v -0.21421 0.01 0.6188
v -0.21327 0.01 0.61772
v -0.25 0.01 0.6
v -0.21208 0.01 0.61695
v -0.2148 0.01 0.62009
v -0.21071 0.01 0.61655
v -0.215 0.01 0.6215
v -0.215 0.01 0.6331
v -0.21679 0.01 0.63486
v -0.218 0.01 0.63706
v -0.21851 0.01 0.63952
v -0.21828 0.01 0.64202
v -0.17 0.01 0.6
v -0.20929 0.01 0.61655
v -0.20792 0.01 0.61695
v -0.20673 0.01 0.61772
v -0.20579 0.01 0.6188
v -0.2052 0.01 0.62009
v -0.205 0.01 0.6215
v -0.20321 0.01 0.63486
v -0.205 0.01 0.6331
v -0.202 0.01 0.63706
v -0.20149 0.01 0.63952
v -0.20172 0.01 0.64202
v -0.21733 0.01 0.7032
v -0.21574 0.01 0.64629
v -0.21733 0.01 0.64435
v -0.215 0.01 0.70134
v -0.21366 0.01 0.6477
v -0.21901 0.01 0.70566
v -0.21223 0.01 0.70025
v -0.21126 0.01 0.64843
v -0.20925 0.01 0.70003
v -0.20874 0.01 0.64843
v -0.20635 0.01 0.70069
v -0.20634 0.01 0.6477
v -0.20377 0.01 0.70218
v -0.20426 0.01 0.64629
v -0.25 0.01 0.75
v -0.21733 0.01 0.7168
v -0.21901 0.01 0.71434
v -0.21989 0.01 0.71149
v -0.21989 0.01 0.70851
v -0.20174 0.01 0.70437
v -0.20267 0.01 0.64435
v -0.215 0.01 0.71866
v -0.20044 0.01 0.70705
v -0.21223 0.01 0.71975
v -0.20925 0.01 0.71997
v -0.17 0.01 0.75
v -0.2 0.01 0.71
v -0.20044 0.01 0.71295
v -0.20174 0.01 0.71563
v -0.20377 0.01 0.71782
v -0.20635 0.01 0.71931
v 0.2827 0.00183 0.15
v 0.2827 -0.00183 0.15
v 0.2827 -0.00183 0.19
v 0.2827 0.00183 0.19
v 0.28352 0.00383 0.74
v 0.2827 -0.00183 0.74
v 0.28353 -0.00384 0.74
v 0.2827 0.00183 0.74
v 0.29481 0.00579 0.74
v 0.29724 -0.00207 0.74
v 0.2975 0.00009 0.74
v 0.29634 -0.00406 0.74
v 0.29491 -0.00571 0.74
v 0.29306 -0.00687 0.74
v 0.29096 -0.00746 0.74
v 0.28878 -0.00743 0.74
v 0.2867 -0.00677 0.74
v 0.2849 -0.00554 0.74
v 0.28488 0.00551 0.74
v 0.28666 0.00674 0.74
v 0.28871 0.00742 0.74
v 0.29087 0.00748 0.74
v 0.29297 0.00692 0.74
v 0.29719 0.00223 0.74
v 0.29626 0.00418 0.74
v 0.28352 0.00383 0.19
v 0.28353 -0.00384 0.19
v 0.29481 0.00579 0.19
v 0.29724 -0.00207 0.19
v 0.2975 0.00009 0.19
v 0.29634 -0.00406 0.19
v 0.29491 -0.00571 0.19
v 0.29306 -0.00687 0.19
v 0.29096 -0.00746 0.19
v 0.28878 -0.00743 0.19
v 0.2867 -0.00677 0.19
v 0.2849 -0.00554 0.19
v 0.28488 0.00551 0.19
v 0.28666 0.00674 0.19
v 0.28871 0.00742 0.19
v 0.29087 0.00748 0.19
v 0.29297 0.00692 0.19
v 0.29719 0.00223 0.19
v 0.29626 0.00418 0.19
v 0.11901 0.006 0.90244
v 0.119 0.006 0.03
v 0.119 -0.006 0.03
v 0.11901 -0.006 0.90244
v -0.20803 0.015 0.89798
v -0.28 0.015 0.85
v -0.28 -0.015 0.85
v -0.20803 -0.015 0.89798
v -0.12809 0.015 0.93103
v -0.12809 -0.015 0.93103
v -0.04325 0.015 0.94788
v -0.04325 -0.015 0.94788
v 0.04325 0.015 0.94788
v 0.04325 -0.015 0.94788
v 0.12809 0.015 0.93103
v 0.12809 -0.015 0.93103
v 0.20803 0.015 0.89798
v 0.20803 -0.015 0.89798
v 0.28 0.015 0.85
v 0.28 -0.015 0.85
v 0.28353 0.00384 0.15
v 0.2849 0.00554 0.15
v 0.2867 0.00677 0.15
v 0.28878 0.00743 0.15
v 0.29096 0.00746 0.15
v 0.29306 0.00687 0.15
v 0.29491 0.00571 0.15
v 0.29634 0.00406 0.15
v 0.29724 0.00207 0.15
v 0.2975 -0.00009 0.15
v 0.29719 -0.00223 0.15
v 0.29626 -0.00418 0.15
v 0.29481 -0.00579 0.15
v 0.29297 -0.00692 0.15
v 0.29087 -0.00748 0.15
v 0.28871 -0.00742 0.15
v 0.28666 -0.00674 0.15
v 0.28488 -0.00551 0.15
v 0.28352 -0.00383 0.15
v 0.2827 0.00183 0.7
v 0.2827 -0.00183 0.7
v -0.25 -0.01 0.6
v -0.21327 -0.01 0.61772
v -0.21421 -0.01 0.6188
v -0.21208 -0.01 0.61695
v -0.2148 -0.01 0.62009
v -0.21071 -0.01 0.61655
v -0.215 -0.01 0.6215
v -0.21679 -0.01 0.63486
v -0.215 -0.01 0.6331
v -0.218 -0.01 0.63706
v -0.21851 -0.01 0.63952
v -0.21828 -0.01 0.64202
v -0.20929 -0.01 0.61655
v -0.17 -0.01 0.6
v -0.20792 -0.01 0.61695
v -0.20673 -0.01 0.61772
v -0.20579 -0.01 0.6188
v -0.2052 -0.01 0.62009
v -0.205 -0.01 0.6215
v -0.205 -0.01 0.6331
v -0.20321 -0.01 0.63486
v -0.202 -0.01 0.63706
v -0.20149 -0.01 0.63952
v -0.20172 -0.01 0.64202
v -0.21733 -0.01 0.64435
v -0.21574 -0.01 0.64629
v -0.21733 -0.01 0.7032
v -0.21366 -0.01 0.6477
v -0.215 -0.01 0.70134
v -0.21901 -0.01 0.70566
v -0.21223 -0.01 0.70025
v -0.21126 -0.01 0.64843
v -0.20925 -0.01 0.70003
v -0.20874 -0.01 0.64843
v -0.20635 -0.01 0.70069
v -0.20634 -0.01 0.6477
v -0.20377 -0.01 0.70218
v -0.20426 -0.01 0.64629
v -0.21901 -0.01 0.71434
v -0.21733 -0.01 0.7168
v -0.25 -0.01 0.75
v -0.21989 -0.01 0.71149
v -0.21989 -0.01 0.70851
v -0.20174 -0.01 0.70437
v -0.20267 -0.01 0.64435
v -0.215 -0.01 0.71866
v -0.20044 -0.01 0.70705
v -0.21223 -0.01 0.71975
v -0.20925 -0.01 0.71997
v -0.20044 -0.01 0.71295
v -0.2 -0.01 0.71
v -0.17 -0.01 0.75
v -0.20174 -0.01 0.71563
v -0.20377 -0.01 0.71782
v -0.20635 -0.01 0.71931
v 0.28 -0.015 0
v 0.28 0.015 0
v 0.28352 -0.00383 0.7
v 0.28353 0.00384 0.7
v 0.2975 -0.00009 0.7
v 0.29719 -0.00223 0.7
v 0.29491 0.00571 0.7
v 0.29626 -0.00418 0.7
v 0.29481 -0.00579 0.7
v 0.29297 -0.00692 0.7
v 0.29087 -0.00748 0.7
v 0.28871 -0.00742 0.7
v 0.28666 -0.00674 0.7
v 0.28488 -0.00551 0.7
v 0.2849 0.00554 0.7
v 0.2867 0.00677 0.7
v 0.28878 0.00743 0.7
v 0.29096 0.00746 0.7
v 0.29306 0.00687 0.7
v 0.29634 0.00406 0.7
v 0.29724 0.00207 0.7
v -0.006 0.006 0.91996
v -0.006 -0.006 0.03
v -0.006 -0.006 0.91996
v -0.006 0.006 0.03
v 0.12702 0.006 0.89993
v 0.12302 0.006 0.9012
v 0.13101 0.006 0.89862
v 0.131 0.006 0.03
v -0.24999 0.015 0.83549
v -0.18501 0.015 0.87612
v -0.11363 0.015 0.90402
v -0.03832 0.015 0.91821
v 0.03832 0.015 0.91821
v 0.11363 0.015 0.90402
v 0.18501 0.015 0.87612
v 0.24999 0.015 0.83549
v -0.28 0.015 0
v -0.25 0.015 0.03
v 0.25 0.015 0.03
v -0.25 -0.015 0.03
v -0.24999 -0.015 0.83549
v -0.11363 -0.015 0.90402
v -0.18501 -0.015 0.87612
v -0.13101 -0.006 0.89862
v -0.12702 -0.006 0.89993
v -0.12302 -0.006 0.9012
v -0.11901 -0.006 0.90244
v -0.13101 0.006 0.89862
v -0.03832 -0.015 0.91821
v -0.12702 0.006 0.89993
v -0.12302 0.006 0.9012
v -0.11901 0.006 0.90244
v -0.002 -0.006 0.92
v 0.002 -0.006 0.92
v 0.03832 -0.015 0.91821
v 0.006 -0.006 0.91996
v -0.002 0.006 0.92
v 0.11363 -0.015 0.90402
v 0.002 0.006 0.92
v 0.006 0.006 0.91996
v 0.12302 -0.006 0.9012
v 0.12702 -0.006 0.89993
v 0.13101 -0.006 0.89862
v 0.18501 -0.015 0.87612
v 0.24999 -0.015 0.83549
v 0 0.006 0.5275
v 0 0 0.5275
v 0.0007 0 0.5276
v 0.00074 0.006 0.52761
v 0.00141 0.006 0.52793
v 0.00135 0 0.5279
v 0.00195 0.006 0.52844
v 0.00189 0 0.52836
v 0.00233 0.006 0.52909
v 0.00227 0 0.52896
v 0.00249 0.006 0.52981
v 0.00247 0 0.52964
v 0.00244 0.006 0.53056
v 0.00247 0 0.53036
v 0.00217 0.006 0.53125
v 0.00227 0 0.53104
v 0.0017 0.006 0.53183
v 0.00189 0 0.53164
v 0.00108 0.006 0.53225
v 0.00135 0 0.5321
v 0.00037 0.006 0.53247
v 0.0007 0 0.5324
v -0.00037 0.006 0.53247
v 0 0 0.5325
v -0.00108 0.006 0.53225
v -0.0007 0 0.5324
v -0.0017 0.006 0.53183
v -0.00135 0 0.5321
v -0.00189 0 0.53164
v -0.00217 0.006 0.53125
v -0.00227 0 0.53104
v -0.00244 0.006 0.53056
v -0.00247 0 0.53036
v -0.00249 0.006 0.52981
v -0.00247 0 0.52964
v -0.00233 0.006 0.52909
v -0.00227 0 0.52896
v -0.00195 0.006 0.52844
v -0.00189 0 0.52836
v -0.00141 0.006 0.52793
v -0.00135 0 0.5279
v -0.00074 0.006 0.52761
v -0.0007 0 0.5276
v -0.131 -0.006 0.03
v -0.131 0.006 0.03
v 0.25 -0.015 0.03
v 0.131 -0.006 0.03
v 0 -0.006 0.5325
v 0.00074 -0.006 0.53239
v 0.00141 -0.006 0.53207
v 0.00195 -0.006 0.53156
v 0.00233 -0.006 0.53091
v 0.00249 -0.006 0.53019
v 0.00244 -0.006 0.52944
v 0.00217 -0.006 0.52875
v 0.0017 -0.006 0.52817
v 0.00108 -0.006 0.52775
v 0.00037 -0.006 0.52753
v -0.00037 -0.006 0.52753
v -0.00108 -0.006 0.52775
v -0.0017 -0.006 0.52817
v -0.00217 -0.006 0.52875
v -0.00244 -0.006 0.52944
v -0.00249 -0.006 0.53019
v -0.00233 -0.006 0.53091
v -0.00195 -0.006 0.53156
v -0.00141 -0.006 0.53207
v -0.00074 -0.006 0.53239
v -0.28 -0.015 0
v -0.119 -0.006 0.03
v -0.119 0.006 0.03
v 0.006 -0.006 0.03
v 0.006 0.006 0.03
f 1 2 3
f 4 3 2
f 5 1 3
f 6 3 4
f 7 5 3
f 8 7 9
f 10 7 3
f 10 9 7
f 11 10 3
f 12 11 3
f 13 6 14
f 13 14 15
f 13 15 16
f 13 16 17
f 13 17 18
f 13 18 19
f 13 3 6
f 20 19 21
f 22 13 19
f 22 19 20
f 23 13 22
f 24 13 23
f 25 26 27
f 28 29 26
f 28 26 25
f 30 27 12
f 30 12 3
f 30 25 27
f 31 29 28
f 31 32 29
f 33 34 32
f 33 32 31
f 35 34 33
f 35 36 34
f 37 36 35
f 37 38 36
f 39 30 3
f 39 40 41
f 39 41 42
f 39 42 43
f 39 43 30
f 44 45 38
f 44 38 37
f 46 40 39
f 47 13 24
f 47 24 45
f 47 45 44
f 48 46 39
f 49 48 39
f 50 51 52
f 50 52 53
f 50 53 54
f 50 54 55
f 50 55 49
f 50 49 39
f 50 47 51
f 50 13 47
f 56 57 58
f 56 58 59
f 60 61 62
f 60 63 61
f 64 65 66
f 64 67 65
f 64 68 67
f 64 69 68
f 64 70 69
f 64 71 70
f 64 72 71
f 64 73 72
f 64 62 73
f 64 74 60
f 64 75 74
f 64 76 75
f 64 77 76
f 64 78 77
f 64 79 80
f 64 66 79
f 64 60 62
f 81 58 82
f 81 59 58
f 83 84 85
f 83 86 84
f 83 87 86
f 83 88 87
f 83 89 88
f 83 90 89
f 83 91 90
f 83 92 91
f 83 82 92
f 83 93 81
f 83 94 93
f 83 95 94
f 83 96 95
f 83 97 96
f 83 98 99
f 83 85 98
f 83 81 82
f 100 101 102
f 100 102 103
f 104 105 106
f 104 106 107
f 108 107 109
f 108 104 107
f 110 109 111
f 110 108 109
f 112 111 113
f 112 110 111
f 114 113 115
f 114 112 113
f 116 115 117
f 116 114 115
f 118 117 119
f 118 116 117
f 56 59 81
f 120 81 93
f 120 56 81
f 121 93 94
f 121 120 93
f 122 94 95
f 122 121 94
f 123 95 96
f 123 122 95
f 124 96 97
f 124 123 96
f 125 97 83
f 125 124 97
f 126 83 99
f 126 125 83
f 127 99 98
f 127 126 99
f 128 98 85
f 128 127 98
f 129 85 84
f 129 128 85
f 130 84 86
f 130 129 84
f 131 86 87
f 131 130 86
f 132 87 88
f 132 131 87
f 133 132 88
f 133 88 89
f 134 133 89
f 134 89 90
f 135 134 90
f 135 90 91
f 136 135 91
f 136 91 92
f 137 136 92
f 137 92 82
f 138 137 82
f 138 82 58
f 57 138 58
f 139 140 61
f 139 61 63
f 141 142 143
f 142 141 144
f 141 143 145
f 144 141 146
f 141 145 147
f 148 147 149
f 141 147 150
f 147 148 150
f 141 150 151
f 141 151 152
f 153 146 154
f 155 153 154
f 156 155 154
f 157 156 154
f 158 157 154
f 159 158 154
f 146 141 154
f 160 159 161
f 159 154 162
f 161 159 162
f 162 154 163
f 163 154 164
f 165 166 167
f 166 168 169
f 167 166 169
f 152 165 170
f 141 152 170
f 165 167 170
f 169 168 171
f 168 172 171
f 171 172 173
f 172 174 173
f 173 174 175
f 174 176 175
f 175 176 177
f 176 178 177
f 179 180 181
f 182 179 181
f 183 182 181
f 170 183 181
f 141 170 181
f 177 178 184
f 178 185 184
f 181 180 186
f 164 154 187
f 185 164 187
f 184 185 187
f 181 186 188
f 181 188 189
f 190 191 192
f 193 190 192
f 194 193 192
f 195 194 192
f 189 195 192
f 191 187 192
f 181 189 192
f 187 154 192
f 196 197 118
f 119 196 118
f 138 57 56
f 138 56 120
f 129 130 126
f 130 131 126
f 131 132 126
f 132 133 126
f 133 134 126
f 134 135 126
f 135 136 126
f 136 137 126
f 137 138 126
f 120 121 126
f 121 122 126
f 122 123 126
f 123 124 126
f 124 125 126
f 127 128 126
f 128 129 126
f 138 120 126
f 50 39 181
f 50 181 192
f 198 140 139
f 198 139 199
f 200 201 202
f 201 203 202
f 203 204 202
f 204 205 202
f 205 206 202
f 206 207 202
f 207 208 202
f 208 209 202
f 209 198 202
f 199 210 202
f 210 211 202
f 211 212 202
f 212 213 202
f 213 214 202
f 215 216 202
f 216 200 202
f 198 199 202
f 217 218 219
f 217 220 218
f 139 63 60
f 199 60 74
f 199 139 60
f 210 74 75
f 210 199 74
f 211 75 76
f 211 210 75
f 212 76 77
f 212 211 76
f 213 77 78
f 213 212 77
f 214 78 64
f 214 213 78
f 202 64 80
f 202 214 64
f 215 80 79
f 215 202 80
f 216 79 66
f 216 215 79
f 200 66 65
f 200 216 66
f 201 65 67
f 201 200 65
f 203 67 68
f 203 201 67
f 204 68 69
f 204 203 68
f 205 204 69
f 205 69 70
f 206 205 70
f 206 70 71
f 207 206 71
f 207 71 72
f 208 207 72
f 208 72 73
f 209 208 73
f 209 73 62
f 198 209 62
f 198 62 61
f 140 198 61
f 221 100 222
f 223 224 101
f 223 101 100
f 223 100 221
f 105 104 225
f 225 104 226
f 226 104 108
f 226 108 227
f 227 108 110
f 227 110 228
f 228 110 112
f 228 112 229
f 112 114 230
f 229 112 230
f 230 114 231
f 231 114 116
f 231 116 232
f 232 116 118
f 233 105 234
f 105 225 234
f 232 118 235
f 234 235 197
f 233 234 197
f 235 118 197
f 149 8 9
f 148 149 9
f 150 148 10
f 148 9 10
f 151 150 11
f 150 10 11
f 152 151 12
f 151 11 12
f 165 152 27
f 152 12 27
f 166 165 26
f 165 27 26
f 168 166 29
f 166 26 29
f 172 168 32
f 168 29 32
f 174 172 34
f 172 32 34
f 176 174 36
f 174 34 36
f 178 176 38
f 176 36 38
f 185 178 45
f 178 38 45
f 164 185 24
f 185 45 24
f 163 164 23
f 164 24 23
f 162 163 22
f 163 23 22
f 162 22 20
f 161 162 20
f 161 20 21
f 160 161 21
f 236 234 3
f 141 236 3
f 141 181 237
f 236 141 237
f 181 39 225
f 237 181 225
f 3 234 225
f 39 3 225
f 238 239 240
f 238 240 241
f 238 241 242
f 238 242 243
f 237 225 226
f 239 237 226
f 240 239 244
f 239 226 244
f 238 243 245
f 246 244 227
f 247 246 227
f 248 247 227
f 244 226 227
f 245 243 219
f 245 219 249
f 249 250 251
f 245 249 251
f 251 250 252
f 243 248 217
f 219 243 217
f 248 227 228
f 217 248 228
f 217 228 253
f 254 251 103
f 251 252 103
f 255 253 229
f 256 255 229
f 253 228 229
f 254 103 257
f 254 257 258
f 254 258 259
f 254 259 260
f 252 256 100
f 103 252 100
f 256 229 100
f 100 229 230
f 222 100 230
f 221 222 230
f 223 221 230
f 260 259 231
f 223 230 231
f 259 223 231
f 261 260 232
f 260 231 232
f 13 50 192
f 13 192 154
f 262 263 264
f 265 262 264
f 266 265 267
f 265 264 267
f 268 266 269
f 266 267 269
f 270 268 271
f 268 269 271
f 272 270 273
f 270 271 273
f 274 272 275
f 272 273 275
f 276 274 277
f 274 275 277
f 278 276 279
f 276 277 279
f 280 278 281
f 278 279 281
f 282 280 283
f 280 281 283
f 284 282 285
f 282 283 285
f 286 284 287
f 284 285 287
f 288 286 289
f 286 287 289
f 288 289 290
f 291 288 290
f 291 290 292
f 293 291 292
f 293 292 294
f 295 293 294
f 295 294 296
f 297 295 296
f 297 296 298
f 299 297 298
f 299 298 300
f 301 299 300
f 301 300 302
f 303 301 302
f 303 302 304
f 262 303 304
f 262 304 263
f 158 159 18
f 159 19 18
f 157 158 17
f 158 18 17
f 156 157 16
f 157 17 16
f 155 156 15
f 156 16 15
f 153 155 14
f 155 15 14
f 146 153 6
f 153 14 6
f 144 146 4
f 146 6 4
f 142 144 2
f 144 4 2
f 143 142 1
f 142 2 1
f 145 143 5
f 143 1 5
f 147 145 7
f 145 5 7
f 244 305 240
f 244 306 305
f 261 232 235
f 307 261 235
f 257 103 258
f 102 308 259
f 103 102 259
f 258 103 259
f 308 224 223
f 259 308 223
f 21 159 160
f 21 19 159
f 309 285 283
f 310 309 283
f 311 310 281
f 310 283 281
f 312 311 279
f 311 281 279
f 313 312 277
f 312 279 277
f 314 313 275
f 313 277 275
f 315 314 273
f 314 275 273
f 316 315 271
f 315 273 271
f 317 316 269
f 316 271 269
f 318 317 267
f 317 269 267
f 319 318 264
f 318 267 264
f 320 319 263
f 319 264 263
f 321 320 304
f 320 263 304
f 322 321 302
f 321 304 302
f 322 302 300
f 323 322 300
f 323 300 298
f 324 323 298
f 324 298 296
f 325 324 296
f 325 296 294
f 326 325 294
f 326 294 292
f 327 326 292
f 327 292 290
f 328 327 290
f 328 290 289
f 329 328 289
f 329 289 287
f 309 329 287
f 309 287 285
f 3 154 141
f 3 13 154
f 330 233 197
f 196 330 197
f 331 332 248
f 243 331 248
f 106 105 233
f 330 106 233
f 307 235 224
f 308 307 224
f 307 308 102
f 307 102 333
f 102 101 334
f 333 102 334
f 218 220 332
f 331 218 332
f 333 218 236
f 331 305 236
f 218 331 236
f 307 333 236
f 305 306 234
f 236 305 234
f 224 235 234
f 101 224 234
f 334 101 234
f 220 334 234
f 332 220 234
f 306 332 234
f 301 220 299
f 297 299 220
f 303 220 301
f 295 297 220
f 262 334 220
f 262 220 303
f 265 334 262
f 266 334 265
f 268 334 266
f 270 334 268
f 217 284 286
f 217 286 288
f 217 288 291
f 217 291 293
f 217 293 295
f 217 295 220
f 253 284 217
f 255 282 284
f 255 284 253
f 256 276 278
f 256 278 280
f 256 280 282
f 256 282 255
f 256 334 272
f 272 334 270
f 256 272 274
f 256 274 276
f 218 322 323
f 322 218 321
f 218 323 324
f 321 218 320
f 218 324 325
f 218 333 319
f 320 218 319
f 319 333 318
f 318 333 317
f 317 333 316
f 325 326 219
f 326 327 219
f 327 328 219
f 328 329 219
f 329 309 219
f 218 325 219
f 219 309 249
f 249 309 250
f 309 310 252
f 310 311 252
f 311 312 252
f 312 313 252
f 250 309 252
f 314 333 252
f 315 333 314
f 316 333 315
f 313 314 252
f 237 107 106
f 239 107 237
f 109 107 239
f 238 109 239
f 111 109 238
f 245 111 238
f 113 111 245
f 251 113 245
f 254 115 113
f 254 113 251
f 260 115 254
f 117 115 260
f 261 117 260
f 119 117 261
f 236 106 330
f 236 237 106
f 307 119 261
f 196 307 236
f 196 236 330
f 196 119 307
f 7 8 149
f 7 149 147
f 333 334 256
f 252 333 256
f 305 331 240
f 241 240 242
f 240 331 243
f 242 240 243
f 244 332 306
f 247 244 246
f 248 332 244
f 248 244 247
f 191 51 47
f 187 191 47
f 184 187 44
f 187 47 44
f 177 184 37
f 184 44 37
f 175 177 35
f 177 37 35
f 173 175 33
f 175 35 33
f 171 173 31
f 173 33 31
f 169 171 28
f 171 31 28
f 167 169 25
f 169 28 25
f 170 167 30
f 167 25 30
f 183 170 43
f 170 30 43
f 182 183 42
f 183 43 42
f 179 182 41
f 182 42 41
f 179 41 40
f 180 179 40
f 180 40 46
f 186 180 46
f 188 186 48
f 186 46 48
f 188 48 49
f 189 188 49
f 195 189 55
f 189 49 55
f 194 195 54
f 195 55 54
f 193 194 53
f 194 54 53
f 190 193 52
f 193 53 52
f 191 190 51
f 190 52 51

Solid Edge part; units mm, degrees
sketch "Sketch1" plane through (0, 0, 0) normal (0, -1, 0) x (1, 0, 0)
  line L0 (-0.28, 0.85) -> (-0.28, 0)
  line L1 (-0.28, 0) -> (0.28, 0)
  line L2 (0.28, 0) -> (0.28, 0.85)
  arc A0 (0.28, 0.85) -> (-0.28, 0.85) centre (0, 0.508) ccw
  line L3 (0.25, 0.8355) -> (0.25, 0.03)
  arc A1 (-0.25, 0.8355) -> (0.25, 0.8355) centre (0, 0.508) cw
  line L4 (-0.25, 0.03) -> (-0.25, 0.8355)
  line L5 (0.25, 0.03) -> (-0.25, 0.03)
  dimension "D1" = 0.28
  dimension "D2" = 0.28
extrude "Protrusion1" add sketch "Sketch1" along normal mid plane 0.03
sketch "Sketch2" plane through (0, 0, 0) normal (0, -1, 0) x (1, 0, 0)
  line L0 (-0.006, 0.03) -> (-0.006, 0.92)
  arc A0 (-0.006, 0.92) -> (0.006, 0.92) centre (0, 0.508) cw
  line L1 (0.006, 0.03) -> (0.006, 0.92)
  line L2 (0.006, 0.03) -> (-0.006, 0.03)
  line L3 (0.119, 0.03) -> (0.119, 0.9024)
  arc A1 (0.119, 0.9024) -> (0.131, 0.8986) centre (0, 0.508) cw
  line L4 (0.131, 0.03) -> (0.131, 0.8986)
  line L5 (0.131, 0.03) -> (0.119, 0.03)
  line L6 (-0.131, 0.03) -> (-0.131, 0.8986)
  arc A2 (-0.131, 0.8986) -> (-0.119, 0.9024) centre (0, 0.508) cw
  line L7 (-0.119, 0.03) -> (-0.119, 0.9024)
  line L8 (-0.119, 0.03) -> (-0.131, 0.03)
  dimension "D1" = 0.125
  dimension "D2" = 0.012
extrude "Stangen" add sketch "Sketch2" along normal mid plane 0.012
hole "Bohrung_1" at (0, 0, 0.53) direction (0, -1, 0) diameter 0.005 end through all both ways yes
sketch "Sketch3" plane through (0, 0, 0) normal (0, 0, -1) x (1, 0, 0)
  line L0 (0.28, 0.0025) -> (0.28, -0.0025)
  line L1 (0.2829, -0.0025) -> (0.28, -0.0025) construction
  line L2 (0.2829, 0.0025) -> (0.28, 0.0025) construction
  arc A0 (0.2829, 0.0025) -> (0.2829, -0.0025) centre (0.29, 0) cw
  dimension "D1" = 0.28
extrude "Protrusion2" add sketch "Sketch3" against normal blind 0.8
sketch "Sketch4" plane through (0, 0, 0) normal (0, -1, 0) x (1, 0, 0)
  line L0 (0.28, 0.15) -> (0.2975, 0.15)
  line L1 (0.2975, 0) -> (0.2975, 0.15)
  line L2 (0.2975, 0) -> (0.28, 0)
  line L3 (0.28, 0.15) -> (0.28, 0)
  line L4 (0.28, 0.74) -> (0.2975, 0.74)
  line L5 (0.2975, 0.74) -> (0.2975, 0.8)
  line L6 (0.28, 0.8) -> (0.2975, 0.8)
  line L7 (0.28, 0.8) -> (0.28, 0.74)
  line L8 (0.28, 0.7) -> (0.28, 0.19)
  line L9 (0.28, 0.19) -> (0.2975, 0.19)
  line L10 (0.2975, 0.19) -> (0.2975, 0.7)
  line L11 (0.28, 0.7) -> (0.2975, 0.7)
  dimension "D1" = 0.04
  dimension "D2" = 0.15
  dimension "D3" = 0.55
extrude "Cutout1" cut sketch "Sketch4" along normal through all and the other way through all
sketch "Sketch5" plane through (0, 0, 0) normal (0, -1, 0) x (1, 0, 0)
  line L0 (-0.17, 0.6) -> (-0.25, 0.6)
  line L1 (-0.25, 0.6) -> (-0.25, 0.75)
  line L2 (-0.25, 0.75) -> (-0.17, 0.75)
  line L3 (-0.17, 0.75) -> (-0.17, 0.6)
  line L4 (-0.215, 0.6331) -> (-0.215, 0.6215)
  arc A0 (-0.215, 0.6215) -> (-0.205, 0.6215) centre (-0.21, 0.6215) ccw
  line L5 (-0.205, 0.6215) -> (-0.205, 0.6331)
  arc A1 (-0.205, 0.6331) -> (-0.215, 0.6331) centre (-0.21, 0.64) ccw
  circle A2 centre (-0.21, 0.71) radius 0.01
  dimension "D1" = 0.25
  dimension "D2" = 0.17
  dimension "D3" = 0.21
extrude "Protrusion3" add sketch "Sketch5" along normal mid plane 0.02
